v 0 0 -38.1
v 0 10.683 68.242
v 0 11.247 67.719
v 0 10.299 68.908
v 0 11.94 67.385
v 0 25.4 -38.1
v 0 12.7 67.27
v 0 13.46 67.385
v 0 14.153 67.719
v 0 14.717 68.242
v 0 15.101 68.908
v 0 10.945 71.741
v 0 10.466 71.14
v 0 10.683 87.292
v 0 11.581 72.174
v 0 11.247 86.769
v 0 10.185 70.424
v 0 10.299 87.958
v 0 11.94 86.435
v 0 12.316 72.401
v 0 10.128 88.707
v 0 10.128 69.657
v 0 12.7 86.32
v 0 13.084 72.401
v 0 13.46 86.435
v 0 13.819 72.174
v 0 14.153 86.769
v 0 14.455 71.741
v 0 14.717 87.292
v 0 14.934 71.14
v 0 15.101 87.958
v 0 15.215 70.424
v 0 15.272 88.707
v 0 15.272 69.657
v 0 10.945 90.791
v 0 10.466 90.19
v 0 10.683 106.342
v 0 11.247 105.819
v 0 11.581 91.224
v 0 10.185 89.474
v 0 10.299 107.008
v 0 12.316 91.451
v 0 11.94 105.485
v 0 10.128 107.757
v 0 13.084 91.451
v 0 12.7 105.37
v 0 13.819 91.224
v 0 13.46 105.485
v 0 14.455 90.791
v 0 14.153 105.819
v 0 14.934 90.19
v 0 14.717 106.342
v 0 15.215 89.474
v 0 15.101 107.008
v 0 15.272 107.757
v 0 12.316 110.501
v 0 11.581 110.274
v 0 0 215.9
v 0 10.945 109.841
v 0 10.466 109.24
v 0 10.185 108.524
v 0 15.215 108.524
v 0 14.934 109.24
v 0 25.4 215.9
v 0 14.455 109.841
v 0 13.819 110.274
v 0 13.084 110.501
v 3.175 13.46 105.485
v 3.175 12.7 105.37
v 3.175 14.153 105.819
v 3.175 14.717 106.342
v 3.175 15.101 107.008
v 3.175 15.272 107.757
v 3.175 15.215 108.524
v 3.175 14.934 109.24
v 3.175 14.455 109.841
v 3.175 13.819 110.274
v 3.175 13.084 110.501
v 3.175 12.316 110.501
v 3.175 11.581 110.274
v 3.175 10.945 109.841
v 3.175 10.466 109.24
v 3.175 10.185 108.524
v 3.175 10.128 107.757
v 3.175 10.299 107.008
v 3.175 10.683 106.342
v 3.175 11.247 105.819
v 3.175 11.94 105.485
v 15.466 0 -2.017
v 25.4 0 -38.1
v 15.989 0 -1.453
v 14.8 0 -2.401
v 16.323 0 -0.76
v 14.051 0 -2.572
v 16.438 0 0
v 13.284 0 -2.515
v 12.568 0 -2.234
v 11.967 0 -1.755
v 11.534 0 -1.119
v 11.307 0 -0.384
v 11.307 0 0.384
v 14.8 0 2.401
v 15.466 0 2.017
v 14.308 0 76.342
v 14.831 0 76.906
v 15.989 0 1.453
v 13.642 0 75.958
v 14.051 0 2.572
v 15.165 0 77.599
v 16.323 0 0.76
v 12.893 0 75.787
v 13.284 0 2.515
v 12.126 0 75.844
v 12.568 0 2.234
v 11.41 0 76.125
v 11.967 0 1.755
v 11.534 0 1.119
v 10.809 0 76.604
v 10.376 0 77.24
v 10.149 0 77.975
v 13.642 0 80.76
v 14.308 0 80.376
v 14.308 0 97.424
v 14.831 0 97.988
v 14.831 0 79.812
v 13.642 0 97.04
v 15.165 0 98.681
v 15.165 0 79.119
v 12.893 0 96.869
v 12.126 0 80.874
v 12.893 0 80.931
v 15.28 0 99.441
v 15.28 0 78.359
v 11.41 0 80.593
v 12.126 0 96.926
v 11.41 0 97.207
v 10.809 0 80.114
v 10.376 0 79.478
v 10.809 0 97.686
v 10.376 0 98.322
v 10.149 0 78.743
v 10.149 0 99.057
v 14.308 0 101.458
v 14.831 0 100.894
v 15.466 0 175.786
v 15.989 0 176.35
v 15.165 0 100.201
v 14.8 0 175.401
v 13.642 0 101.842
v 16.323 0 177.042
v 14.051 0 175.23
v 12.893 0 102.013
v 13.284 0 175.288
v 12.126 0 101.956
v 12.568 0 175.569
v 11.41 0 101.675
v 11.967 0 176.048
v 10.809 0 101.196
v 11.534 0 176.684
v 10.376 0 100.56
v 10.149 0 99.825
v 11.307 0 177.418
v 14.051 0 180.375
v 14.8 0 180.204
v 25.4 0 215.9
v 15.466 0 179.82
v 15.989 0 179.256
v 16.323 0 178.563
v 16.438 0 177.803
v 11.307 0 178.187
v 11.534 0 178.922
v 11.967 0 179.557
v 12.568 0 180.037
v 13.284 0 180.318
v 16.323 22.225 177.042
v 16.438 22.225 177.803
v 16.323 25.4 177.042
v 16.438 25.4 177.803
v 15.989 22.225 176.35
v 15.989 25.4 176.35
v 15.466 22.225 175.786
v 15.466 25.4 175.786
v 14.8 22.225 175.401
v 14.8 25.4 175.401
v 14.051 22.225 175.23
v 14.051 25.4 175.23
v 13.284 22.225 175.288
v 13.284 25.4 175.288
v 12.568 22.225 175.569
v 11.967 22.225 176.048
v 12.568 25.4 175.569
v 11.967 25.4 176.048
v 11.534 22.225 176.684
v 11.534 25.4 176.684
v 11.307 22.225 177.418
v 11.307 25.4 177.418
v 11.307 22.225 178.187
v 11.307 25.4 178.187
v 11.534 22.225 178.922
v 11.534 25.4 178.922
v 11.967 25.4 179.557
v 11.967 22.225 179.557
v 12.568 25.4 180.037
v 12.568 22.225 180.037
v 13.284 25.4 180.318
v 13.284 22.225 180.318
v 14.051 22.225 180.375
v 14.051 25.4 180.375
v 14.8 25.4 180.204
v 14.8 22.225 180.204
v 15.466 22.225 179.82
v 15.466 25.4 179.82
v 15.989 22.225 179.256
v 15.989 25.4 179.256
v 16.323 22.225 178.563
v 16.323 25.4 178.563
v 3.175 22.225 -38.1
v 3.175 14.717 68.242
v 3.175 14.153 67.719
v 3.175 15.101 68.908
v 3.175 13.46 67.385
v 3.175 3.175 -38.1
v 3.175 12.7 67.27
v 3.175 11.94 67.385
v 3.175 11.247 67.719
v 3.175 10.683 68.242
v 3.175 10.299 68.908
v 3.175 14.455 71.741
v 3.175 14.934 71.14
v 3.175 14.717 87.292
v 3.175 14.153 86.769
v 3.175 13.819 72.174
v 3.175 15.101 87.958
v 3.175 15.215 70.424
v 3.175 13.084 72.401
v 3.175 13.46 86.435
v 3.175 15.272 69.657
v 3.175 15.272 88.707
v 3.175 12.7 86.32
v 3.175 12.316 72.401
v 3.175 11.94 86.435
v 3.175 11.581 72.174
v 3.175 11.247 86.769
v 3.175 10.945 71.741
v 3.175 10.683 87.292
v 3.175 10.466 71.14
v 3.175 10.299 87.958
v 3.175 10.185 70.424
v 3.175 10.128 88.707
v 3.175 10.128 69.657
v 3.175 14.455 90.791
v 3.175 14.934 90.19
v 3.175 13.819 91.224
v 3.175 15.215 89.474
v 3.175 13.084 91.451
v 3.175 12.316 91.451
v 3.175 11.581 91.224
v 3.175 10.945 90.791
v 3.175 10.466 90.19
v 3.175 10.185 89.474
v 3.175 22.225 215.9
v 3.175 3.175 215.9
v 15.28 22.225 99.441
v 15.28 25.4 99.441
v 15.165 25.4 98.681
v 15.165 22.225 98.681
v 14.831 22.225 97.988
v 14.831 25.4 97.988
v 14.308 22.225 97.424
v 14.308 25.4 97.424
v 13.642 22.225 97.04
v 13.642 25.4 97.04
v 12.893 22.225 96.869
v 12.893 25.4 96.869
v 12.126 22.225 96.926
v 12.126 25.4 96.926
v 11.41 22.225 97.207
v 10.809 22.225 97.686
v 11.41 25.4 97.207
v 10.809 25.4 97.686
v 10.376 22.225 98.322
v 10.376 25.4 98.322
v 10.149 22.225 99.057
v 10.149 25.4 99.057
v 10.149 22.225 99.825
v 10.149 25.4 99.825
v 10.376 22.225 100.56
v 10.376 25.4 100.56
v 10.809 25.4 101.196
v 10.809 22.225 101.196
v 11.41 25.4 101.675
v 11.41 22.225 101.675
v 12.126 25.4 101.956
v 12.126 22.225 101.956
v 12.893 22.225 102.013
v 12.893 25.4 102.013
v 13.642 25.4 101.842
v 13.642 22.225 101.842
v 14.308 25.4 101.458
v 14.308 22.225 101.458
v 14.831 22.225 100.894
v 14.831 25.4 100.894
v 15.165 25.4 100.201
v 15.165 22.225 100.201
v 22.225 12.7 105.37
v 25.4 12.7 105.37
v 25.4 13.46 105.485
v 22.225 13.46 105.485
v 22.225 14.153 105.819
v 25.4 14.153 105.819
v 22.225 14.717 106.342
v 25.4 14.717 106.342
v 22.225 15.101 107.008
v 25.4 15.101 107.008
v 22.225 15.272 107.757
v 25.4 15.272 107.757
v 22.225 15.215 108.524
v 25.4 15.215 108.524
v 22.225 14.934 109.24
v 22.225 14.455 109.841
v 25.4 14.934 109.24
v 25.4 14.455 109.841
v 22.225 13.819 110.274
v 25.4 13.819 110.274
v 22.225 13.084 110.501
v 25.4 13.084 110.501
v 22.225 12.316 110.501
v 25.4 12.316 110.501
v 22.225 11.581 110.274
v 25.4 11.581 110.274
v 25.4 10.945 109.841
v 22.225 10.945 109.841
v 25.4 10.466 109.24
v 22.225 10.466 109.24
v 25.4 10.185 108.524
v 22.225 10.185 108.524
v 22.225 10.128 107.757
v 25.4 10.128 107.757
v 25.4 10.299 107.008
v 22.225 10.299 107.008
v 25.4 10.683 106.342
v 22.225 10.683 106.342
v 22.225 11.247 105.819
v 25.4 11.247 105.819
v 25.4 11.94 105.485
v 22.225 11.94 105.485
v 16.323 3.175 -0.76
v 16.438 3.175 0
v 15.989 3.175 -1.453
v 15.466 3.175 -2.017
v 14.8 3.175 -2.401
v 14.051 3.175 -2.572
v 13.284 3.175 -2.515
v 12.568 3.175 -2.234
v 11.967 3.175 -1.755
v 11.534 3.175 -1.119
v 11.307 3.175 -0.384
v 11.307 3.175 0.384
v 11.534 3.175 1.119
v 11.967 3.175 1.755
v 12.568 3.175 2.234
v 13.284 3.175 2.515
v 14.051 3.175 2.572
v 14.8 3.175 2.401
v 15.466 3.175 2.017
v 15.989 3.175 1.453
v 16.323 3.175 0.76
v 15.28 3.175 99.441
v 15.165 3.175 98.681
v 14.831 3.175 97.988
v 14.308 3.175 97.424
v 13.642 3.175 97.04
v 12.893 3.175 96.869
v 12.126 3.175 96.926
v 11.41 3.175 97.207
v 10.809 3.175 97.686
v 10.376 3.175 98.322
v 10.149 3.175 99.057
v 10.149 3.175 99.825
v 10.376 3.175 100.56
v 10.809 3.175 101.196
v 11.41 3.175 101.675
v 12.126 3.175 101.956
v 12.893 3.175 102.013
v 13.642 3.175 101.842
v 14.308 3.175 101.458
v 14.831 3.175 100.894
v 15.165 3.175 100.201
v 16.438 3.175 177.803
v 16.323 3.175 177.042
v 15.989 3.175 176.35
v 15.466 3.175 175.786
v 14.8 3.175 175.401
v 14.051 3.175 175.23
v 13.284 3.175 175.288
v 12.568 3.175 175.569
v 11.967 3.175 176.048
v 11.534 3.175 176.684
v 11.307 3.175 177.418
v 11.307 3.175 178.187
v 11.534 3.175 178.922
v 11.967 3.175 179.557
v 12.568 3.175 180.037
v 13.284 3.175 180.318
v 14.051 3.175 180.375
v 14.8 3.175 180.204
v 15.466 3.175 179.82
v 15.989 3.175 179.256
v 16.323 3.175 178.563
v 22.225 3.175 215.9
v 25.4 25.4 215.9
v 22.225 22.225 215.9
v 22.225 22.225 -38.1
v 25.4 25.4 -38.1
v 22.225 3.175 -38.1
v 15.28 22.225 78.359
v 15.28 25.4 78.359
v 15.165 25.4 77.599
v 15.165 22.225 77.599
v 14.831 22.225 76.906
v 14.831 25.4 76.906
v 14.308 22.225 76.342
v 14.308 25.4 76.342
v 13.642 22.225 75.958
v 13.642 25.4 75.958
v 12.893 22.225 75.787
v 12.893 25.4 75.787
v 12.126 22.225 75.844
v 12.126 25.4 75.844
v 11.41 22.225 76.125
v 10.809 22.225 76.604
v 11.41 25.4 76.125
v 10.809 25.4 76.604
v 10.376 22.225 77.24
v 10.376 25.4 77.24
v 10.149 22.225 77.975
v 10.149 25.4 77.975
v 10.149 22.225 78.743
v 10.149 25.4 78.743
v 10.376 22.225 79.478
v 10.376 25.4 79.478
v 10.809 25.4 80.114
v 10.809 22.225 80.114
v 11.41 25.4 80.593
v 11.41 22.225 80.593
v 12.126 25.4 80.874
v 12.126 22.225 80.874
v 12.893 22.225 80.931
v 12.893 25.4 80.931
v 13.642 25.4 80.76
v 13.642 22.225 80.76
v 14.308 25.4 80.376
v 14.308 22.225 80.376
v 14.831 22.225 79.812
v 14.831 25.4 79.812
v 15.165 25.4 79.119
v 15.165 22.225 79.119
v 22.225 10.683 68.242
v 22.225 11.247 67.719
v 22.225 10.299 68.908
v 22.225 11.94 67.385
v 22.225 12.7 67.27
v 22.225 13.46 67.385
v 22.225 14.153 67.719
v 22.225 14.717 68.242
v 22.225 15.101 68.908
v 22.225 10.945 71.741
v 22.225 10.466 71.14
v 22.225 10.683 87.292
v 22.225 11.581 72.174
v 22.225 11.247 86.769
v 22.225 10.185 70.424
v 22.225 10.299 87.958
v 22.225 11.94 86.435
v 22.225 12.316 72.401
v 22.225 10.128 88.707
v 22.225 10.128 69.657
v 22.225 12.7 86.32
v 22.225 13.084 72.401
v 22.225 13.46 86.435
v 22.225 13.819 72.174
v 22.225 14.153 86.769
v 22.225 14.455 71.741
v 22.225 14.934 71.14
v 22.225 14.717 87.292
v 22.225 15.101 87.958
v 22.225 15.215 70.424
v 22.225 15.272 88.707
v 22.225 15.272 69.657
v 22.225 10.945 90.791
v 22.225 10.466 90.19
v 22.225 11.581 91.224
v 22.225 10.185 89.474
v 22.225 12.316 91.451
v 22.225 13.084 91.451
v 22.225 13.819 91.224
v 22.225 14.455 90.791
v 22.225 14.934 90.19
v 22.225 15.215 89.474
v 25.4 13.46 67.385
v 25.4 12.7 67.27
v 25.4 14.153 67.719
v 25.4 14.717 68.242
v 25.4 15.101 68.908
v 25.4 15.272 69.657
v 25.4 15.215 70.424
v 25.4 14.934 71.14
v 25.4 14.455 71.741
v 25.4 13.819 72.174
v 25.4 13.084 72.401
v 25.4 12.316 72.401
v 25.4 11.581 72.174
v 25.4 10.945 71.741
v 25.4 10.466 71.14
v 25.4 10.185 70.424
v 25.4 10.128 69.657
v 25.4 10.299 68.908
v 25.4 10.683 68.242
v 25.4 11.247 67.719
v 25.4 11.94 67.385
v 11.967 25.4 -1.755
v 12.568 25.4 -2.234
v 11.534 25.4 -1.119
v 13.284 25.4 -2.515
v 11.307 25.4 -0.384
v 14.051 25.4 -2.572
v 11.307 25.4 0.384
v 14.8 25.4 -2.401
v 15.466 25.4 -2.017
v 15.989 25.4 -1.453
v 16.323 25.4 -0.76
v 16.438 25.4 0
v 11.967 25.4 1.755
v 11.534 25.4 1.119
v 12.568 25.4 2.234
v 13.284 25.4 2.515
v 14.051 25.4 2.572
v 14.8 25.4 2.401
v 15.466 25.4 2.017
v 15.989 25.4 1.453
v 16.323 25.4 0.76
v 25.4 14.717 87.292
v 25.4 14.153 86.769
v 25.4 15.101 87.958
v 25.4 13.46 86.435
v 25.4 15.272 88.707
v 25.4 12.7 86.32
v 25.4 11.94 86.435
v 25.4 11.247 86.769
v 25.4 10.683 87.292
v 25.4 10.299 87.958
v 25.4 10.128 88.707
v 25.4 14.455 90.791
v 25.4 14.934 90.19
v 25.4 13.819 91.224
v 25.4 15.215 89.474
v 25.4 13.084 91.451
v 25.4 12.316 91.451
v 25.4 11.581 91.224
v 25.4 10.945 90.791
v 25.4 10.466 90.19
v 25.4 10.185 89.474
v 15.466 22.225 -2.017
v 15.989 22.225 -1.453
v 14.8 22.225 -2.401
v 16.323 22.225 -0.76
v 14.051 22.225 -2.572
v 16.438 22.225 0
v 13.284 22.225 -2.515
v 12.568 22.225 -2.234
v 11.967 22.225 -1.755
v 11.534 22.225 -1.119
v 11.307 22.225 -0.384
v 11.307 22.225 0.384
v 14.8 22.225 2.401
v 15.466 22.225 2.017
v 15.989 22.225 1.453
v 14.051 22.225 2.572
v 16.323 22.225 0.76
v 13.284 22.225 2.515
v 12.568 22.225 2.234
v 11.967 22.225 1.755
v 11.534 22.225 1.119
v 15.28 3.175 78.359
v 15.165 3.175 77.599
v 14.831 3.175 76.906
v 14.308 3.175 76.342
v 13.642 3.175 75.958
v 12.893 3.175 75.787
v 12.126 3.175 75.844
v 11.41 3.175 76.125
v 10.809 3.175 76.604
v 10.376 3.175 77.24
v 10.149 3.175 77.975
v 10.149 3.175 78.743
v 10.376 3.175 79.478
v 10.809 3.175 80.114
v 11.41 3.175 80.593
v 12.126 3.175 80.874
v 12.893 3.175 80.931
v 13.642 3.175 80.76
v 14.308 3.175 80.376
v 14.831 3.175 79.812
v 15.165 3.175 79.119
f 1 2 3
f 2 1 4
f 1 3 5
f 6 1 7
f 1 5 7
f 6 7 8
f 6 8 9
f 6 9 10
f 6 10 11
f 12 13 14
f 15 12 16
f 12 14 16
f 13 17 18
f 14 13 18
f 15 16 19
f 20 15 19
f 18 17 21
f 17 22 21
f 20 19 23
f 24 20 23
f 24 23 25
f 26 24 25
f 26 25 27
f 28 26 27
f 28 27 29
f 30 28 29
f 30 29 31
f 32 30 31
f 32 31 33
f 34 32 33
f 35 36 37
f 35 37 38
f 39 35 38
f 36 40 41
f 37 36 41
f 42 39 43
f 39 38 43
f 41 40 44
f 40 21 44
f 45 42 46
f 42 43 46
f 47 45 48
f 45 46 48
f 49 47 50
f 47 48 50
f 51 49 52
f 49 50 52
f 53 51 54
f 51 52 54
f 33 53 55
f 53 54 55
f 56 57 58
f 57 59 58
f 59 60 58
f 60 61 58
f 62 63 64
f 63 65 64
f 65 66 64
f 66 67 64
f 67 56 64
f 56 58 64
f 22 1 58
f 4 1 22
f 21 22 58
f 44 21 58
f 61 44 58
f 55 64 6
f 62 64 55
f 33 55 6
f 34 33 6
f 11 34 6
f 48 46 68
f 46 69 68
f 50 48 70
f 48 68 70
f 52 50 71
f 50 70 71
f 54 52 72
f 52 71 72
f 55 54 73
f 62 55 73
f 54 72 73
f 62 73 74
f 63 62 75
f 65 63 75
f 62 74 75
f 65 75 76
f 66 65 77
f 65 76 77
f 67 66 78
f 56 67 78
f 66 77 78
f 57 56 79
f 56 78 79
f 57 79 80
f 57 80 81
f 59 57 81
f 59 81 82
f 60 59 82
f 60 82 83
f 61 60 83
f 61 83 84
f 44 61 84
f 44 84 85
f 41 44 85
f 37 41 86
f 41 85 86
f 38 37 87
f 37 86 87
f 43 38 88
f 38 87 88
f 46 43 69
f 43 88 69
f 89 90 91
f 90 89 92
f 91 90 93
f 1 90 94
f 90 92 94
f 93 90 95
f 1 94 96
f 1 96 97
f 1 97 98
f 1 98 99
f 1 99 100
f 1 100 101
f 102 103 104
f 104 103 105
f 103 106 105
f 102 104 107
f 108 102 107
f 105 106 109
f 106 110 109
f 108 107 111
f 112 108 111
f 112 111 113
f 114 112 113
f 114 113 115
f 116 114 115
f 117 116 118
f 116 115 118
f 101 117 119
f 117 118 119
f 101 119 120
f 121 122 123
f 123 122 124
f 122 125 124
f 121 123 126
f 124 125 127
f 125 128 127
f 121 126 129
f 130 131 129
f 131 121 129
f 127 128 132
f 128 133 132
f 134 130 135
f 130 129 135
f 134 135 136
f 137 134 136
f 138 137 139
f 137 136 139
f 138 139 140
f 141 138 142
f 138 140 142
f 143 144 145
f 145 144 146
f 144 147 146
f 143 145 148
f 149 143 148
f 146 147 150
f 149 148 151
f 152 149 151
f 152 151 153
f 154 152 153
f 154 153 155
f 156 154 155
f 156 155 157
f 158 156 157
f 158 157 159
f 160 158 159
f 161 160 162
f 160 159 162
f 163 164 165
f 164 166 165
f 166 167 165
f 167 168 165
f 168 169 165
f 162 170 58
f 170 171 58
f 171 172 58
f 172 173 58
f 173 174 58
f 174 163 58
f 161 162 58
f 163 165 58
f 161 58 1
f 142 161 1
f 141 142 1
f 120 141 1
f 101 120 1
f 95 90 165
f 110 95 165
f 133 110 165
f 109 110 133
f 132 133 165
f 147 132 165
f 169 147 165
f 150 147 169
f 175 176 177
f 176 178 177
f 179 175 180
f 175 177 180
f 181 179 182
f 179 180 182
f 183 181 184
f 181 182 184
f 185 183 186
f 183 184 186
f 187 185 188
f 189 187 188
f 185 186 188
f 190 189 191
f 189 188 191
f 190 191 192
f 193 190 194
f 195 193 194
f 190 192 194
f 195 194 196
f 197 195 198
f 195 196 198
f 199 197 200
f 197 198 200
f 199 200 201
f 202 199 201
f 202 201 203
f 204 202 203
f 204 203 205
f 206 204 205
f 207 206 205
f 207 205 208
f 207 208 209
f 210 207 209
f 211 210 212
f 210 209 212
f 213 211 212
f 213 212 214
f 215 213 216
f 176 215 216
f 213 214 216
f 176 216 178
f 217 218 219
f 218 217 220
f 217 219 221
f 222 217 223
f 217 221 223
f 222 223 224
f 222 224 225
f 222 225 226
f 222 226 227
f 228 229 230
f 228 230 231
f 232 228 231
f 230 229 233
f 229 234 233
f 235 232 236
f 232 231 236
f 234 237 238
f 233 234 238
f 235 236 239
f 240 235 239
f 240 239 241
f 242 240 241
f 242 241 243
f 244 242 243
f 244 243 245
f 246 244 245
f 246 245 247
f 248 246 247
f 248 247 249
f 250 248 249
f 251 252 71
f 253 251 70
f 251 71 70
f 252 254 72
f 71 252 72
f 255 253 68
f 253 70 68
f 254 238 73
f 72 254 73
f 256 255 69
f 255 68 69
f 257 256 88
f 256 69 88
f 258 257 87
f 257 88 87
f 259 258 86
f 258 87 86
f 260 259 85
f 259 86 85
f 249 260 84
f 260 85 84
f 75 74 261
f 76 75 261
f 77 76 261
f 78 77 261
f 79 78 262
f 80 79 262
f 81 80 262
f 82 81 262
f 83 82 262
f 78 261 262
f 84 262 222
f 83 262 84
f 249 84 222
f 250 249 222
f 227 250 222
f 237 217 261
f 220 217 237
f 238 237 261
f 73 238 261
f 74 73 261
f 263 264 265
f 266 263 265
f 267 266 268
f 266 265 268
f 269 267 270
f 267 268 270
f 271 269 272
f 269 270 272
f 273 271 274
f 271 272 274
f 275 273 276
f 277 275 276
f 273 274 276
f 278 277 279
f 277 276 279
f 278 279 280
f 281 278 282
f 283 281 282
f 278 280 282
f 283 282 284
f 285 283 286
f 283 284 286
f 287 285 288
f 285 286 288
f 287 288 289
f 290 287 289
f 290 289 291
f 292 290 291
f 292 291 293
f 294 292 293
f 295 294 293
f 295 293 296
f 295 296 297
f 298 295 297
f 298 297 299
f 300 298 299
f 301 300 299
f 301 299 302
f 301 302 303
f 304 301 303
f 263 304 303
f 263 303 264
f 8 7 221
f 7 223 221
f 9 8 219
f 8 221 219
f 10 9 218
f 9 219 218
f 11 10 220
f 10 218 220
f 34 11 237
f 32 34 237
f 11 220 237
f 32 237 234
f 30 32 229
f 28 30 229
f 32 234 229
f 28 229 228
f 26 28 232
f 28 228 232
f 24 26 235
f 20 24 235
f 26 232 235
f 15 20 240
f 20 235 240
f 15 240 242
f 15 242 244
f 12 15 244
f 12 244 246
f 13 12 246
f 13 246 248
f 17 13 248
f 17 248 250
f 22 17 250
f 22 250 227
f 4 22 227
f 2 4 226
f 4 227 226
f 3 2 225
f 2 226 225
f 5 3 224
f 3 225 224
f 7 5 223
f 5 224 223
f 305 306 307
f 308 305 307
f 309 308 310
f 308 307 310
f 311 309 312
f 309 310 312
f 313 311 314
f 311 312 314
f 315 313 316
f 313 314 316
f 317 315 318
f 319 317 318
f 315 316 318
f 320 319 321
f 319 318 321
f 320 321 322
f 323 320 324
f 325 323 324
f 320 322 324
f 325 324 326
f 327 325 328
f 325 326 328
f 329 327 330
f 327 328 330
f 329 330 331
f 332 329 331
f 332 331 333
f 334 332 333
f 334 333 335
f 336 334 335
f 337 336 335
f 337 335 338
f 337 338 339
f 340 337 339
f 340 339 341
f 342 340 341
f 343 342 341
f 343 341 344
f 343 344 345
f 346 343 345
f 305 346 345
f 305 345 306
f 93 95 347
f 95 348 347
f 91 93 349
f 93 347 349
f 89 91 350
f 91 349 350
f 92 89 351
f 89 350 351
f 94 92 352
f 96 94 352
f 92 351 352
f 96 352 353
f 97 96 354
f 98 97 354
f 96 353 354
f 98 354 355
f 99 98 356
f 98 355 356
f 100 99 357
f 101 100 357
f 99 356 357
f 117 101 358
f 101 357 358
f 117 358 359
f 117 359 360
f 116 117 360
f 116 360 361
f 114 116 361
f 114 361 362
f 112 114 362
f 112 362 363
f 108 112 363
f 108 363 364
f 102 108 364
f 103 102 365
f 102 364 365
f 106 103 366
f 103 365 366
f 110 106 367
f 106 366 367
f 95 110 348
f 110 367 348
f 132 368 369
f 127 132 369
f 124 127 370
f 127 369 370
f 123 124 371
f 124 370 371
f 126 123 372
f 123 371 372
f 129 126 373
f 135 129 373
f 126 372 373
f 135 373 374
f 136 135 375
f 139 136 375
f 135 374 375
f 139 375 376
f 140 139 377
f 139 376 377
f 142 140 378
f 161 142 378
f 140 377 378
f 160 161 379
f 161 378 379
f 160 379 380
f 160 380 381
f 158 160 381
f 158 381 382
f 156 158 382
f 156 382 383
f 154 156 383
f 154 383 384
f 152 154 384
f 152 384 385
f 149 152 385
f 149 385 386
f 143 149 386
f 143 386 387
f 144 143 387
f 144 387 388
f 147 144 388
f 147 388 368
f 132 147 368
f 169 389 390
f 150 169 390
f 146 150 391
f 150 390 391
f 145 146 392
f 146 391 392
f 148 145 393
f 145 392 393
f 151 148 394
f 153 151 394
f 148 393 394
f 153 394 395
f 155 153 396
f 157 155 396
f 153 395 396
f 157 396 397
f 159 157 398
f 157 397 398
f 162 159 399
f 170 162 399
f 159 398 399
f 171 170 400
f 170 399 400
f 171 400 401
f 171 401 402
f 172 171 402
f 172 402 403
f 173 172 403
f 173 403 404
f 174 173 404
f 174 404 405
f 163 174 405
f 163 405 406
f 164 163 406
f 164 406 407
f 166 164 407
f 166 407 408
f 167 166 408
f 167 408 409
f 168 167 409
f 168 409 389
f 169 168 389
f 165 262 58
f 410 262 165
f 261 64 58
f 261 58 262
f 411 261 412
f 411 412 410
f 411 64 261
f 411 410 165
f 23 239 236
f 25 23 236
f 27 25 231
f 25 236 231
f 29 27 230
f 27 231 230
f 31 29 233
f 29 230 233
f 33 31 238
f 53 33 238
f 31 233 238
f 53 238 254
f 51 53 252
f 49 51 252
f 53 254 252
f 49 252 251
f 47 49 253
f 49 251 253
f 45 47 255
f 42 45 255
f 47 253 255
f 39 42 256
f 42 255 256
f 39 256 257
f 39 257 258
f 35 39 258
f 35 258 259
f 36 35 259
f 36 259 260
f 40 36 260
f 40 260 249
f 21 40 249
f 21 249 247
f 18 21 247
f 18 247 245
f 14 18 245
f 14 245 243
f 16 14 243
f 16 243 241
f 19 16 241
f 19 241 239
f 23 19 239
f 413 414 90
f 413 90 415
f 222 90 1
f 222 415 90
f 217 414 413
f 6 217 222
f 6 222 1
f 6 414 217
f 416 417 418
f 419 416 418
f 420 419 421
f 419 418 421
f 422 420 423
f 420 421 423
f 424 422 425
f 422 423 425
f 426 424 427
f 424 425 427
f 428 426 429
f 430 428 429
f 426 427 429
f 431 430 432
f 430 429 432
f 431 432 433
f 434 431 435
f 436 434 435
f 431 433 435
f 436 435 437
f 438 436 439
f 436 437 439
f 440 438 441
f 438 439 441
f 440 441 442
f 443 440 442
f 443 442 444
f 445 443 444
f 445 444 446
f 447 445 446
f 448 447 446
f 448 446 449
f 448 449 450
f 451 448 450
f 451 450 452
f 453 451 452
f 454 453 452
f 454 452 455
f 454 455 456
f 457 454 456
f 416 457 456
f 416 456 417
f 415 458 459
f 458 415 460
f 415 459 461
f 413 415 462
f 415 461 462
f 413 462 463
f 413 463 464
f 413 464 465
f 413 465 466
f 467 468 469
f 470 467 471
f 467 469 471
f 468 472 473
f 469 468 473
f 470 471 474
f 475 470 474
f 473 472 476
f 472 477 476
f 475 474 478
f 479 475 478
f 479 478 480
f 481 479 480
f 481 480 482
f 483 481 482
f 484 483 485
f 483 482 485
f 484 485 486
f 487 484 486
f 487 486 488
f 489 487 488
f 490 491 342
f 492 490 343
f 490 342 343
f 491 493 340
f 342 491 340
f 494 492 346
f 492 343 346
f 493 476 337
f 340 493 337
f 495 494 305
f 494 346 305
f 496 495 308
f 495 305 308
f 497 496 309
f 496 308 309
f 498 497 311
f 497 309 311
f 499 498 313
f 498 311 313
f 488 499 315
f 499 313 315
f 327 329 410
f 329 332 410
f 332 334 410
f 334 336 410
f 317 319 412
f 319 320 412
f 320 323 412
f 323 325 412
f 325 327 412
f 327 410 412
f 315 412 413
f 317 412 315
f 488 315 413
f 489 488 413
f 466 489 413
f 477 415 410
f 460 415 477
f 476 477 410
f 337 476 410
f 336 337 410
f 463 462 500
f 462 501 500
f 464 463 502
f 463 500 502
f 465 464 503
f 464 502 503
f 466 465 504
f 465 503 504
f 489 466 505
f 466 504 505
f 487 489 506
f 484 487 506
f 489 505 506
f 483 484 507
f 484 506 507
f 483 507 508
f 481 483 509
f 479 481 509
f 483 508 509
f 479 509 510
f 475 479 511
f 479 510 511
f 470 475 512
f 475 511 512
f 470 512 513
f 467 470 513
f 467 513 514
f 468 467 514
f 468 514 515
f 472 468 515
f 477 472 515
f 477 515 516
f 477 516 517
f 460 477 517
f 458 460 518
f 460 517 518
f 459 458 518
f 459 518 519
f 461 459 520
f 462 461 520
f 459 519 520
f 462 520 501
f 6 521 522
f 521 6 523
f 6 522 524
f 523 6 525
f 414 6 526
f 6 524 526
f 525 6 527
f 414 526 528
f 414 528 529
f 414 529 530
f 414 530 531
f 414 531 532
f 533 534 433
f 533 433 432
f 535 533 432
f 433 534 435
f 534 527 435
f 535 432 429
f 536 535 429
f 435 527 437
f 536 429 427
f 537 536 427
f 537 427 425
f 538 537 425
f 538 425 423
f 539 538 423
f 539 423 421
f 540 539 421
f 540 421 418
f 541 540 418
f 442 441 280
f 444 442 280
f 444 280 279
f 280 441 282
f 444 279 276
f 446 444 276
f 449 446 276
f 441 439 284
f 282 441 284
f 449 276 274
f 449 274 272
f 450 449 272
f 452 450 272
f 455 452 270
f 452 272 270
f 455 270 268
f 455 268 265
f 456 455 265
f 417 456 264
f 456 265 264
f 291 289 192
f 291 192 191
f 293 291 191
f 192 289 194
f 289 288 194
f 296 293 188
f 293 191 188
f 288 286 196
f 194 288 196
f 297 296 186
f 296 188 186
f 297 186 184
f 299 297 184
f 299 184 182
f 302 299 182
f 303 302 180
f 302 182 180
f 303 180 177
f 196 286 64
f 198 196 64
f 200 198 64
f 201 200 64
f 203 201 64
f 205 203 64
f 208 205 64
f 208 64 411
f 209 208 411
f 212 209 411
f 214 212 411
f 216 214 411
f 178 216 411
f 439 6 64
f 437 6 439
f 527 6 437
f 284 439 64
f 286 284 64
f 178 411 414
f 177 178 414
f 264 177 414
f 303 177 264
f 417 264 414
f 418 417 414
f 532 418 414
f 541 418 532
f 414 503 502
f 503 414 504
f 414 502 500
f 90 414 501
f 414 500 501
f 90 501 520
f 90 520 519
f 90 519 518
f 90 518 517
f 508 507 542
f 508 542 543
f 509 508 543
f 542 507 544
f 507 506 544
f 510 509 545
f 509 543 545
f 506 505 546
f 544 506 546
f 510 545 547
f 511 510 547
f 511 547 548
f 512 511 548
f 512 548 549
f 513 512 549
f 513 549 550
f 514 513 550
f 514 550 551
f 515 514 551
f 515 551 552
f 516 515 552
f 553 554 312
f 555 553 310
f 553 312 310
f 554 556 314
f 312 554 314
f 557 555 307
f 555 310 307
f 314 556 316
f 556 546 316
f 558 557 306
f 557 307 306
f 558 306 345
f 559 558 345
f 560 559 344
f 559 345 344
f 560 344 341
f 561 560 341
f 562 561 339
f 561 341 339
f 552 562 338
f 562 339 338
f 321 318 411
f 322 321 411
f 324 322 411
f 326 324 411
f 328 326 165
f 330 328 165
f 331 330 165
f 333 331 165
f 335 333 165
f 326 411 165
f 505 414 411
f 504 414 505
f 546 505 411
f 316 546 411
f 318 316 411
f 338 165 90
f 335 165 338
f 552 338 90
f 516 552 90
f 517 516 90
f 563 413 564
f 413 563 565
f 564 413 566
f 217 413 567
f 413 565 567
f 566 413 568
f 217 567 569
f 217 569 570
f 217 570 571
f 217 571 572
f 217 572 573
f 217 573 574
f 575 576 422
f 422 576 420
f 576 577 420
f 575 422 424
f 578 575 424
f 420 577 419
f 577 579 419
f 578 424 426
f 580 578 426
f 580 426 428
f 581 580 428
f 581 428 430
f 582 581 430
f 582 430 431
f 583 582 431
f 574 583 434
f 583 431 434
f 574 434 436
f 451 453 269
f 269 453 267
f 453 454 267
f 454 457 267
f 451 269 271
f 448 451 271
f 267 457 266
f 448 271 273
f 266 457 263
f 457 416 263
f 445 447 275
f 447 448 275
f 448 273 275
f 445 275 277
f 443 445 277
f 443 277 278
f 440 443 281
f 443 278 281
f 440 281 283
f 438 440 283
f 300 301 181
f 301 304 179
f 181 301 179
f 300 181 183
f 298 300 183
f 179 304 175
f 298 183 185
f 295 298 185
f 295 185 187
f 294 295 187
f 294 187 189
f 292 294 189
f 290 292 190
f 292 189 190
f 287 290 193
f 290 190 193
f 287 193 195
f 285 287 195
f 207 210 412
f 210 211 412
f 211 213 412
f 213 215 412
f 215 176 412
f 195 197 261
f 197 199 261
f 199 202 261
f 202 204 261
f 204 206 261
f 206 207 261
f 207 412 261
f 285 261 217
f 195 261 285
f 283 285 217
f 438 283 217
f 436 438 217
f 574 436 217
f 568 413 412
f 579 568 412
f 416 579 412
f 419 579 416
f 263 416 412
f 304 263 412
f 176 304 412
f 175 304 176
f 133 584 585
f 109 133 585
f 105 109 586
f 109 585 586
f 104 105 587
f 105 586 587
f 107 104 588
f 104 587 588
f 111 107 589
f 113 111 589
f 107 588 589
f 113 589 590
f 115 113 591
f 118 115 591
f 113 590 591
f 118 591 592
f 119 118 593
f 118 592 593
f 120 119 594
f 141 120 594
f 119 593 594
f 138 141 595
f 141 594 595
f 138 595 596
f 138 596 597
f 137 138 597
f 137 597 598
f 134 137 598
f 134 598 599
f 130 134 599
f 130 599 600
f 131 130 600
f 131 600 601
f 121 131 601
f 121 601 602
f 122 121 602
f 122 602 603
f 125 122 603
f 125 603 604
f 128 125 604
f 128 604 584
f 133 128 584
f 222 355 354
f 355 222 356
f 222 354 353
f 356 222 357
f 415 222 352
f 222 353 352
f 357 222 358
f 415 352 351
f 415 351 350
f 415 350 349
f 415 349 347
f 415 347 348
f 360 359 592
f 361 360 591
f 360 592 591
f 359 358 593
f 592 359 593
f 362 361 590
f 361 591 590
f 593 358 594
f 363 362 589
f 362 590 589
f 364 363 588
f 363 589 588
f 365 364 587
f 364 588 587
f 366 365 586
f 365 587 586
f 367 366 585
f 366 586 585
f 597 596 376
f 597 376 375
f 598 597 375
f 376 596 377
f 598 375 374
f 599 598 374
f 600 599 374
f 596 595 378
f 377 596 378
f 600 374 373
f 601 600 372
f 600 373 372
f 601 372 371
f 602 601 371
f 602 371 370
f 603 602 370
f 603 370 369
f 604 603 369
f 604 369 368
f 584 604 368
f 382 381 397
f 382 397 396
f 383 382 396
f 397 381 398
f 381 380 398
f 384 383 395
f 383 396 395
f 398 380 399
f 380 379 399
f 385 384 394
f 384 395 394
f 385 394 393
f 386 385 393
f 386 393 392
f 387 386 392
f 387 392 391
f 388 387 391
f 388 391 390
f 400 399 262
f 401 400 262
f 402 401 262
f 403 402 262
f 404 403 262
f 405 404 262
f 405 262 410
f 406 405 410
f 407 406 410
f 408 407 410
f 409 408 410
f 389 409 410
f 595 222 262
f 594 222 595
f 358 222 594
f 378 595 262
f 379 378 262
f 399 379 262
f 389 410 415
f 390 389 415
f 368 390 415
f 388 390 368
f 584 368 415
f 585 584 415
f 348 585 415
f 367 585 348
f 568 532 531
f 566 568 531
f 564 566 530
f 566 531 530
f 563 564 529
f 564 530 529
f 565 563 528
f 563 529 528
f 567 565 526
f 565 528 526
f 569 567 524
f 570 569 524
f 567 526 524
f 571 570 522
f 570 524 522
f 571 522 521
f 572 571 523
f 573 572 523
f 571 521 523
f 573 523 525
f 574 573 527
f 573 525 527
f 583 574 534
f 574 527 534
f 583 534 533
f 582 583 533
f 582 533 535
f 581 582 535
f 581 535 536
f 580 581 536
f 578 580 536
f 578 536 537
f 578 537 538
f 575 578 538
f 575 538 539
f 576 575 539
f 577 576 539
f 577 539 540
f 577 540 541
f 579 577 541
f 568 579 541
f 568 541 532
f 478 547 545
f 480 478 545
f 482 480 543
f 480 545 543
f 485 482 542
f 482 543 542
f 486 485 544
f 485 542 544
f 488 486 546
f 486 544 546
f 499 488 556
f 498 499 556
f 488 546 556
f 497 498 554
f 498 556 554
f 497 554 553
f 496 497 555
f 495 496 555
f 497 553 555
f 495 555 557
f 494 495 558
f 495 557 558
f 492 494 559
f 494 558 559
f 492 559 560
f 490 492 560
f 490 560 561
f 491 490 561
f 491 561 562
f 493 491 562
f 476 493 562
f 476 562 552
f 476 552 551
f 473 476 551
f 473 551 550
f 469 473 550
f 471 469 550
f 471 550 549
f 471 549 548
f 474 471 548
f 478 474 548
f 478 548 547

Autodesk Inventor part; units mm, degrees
ref_plane "YZ Plane" through (0, 0, 0) normal (1, 0, 0) x (0, 1, 0)
ref_plane "XZ Plane" through (0, 0, 0) normal (0, 1, 0) x (-1, 0, 0)
ref_plane "XY Plane" through (0, 0, 0) normal (0, 0, 1) x (1, 0, 0)
sketch "Sketch1" plane through (0, 0, 0) normal (0, 0, 1) x (1, 0, 0)
  line L0 (0, 0) -> (25.4, 0)
  line L1 (25.4, 0) -> (25.4, 25.4)
  line L2 (25.4, 25.4) -> (0, 25.4)
  line L3 (0, 25.4) -> (0, 0)
  line L4 (3.175, 22.225) -> (22.225, 22.225)
  line L5 (22.225, 22.225) -> (22.225, 3.175)
  line L6 (22.225, 3.175) -> (3.175, 3.175)
  line L7 (3.175, 3.175) -> (3.175, 22.225)
  dimension "d0" = 25.4
  dimension "d1" = 25.4
  dimension "d2" = 3.175
extrude "Extrusion1" add sketch "Sketch1" along normal blind 190.5 and the other way blind 12.7
sketch "Sketch2" plane through (0, 25.4, -12.7) normal (0, 1, 0) x (1, 0, 0)
  line L0 (13.8579, 0) -> (13.8579, -12.7) construction
  line L1 (13.8579, -203.2028) -> (13.8579, -190.5028) construction
  circle A0 centre (13.8579, -190.5028) radius 2.5797
  circle A1 centre (13.8579, -12.7) radius 2.5797
  point P0 (0, -12.7)
  dimension "d6" = 12.7
  dimension "d7" = 12.7
  dimension "d8" = 5.1594
  dimension "d9" = 5.1594
extrude "Extrusion2" cut sketch "Sketch2" against normal blind 152.4
sketch "Sketch3" plane through (0, 0, 190.5) normal (0, 0, 1) x (1, 0, 0)
  line L0 (3.175, 3.175) -> (3.175, 22.225) projected
  line L1 (22.225, 22.225) -> (22.225, 3.175) projected
  line L2 (22.225, 3.175) -> (3.175, 3.175) projected
  line L3 (3.175, 3.175) -> (3.175, 22.225) projected
  line L4 (3.175, 22.225) -> (22.225, 22.225) projected
  line L5 (0, 0) -> (25.4, 0) projected
  line L6 (25.4, 0) -> (25.4, 25.4) projected
  line L7 (25.4, 25.4) -> (0, 25.4) projected
  line L8 (0, 25.4) -> (0, 0) projected
extrude "Extrusion3" add sketch "Sketch3" along normal blind 25.4
sketch "Sketch4" plane through (0, 0, -12.7) normal (0, 0, -1) x (-1, 0, 0)
  line L0 (-22.225, 3.175) -> (-22.225, 22.225) projected
  line L1 (-22.225, 22.225) -> (-3.175, 22.225) projected
  line L2 (-3.175, 22.225) -> (-3.175, 3.175) projected
  line L3 (-3.175, 3.175) -> (-22.225, 3.175) projected
  line L4 (-25.4, 0) -> (0, 0) projected
  line L5 (0, 0) -> (0, 25.4) projected
  line L6 (0, 25.4) -> (-25.4, 25.4) projected
  line L7 (-25.4, 25.4) -> (-25.4, 0) projected
extrude "Extrusion4" add sketch "Sketch4" along normal blind 25.4
sketch "Sketch5" plane through (0, 25.4, 215.9) normal (0, 1, 0) x (1, 0, 0)
  line L0 (3.175, 0) -> (22.225, 0) construction
  line L1 (12.7, 0) -> (12.7, 116.459) construction
  line L2 (22.225, 254) -> (3.175, 254) construction
  line L3 (12.7, 254) -> (12.7, 137.541) construction
  circle A0 centre (12.7, 137.541) radius 2.5797
  circle A1 centre (12.7, 116.459) radius 2.5797
  point P0 (0, 215.9)
  dimension "d18" = 116.459
  dimension "d19" = 116.459
  dimension "d20" = 5.1594
  dimension "d21" = 5.1594
extrude "Extrusion5" cut sketch "Sketch5" against normal blind 50.8
sketch "Sketch6" plane through (25.4, 0, 215.9) normal (1, 0, 0) x (0, 0, -1)
  line L0 (254, 25.4) -> (0, 25.4) construction
  line L1 (127, 25.4) -> (127, 12.7) construction
  line L2 (127, 12.7) -> (146.05, 12.7) construction
  line L3 (127, 12.7) -> (107.95, 12.7) construction
  circle A0 centre (127, 12.7) radius 2.5797
  circle A1 centre (146.05, 12.7) radius 2.5797
  circle A2 centre (107.95, 12.7) radius 2.5797
  point P0 (215.9, 0)
  dimension "d24" = 12.7
  dimension "d25" = 19.05
  dimension "d26" = 19.05
  dimension "d27" = 5.1594
  dimension "d28" = 5.1594
  dimension "d29" = 5.1594
extrude "Extrusion6" cut sketch "Sketch6" against normal blind 25.4
properties part number "base mount"
